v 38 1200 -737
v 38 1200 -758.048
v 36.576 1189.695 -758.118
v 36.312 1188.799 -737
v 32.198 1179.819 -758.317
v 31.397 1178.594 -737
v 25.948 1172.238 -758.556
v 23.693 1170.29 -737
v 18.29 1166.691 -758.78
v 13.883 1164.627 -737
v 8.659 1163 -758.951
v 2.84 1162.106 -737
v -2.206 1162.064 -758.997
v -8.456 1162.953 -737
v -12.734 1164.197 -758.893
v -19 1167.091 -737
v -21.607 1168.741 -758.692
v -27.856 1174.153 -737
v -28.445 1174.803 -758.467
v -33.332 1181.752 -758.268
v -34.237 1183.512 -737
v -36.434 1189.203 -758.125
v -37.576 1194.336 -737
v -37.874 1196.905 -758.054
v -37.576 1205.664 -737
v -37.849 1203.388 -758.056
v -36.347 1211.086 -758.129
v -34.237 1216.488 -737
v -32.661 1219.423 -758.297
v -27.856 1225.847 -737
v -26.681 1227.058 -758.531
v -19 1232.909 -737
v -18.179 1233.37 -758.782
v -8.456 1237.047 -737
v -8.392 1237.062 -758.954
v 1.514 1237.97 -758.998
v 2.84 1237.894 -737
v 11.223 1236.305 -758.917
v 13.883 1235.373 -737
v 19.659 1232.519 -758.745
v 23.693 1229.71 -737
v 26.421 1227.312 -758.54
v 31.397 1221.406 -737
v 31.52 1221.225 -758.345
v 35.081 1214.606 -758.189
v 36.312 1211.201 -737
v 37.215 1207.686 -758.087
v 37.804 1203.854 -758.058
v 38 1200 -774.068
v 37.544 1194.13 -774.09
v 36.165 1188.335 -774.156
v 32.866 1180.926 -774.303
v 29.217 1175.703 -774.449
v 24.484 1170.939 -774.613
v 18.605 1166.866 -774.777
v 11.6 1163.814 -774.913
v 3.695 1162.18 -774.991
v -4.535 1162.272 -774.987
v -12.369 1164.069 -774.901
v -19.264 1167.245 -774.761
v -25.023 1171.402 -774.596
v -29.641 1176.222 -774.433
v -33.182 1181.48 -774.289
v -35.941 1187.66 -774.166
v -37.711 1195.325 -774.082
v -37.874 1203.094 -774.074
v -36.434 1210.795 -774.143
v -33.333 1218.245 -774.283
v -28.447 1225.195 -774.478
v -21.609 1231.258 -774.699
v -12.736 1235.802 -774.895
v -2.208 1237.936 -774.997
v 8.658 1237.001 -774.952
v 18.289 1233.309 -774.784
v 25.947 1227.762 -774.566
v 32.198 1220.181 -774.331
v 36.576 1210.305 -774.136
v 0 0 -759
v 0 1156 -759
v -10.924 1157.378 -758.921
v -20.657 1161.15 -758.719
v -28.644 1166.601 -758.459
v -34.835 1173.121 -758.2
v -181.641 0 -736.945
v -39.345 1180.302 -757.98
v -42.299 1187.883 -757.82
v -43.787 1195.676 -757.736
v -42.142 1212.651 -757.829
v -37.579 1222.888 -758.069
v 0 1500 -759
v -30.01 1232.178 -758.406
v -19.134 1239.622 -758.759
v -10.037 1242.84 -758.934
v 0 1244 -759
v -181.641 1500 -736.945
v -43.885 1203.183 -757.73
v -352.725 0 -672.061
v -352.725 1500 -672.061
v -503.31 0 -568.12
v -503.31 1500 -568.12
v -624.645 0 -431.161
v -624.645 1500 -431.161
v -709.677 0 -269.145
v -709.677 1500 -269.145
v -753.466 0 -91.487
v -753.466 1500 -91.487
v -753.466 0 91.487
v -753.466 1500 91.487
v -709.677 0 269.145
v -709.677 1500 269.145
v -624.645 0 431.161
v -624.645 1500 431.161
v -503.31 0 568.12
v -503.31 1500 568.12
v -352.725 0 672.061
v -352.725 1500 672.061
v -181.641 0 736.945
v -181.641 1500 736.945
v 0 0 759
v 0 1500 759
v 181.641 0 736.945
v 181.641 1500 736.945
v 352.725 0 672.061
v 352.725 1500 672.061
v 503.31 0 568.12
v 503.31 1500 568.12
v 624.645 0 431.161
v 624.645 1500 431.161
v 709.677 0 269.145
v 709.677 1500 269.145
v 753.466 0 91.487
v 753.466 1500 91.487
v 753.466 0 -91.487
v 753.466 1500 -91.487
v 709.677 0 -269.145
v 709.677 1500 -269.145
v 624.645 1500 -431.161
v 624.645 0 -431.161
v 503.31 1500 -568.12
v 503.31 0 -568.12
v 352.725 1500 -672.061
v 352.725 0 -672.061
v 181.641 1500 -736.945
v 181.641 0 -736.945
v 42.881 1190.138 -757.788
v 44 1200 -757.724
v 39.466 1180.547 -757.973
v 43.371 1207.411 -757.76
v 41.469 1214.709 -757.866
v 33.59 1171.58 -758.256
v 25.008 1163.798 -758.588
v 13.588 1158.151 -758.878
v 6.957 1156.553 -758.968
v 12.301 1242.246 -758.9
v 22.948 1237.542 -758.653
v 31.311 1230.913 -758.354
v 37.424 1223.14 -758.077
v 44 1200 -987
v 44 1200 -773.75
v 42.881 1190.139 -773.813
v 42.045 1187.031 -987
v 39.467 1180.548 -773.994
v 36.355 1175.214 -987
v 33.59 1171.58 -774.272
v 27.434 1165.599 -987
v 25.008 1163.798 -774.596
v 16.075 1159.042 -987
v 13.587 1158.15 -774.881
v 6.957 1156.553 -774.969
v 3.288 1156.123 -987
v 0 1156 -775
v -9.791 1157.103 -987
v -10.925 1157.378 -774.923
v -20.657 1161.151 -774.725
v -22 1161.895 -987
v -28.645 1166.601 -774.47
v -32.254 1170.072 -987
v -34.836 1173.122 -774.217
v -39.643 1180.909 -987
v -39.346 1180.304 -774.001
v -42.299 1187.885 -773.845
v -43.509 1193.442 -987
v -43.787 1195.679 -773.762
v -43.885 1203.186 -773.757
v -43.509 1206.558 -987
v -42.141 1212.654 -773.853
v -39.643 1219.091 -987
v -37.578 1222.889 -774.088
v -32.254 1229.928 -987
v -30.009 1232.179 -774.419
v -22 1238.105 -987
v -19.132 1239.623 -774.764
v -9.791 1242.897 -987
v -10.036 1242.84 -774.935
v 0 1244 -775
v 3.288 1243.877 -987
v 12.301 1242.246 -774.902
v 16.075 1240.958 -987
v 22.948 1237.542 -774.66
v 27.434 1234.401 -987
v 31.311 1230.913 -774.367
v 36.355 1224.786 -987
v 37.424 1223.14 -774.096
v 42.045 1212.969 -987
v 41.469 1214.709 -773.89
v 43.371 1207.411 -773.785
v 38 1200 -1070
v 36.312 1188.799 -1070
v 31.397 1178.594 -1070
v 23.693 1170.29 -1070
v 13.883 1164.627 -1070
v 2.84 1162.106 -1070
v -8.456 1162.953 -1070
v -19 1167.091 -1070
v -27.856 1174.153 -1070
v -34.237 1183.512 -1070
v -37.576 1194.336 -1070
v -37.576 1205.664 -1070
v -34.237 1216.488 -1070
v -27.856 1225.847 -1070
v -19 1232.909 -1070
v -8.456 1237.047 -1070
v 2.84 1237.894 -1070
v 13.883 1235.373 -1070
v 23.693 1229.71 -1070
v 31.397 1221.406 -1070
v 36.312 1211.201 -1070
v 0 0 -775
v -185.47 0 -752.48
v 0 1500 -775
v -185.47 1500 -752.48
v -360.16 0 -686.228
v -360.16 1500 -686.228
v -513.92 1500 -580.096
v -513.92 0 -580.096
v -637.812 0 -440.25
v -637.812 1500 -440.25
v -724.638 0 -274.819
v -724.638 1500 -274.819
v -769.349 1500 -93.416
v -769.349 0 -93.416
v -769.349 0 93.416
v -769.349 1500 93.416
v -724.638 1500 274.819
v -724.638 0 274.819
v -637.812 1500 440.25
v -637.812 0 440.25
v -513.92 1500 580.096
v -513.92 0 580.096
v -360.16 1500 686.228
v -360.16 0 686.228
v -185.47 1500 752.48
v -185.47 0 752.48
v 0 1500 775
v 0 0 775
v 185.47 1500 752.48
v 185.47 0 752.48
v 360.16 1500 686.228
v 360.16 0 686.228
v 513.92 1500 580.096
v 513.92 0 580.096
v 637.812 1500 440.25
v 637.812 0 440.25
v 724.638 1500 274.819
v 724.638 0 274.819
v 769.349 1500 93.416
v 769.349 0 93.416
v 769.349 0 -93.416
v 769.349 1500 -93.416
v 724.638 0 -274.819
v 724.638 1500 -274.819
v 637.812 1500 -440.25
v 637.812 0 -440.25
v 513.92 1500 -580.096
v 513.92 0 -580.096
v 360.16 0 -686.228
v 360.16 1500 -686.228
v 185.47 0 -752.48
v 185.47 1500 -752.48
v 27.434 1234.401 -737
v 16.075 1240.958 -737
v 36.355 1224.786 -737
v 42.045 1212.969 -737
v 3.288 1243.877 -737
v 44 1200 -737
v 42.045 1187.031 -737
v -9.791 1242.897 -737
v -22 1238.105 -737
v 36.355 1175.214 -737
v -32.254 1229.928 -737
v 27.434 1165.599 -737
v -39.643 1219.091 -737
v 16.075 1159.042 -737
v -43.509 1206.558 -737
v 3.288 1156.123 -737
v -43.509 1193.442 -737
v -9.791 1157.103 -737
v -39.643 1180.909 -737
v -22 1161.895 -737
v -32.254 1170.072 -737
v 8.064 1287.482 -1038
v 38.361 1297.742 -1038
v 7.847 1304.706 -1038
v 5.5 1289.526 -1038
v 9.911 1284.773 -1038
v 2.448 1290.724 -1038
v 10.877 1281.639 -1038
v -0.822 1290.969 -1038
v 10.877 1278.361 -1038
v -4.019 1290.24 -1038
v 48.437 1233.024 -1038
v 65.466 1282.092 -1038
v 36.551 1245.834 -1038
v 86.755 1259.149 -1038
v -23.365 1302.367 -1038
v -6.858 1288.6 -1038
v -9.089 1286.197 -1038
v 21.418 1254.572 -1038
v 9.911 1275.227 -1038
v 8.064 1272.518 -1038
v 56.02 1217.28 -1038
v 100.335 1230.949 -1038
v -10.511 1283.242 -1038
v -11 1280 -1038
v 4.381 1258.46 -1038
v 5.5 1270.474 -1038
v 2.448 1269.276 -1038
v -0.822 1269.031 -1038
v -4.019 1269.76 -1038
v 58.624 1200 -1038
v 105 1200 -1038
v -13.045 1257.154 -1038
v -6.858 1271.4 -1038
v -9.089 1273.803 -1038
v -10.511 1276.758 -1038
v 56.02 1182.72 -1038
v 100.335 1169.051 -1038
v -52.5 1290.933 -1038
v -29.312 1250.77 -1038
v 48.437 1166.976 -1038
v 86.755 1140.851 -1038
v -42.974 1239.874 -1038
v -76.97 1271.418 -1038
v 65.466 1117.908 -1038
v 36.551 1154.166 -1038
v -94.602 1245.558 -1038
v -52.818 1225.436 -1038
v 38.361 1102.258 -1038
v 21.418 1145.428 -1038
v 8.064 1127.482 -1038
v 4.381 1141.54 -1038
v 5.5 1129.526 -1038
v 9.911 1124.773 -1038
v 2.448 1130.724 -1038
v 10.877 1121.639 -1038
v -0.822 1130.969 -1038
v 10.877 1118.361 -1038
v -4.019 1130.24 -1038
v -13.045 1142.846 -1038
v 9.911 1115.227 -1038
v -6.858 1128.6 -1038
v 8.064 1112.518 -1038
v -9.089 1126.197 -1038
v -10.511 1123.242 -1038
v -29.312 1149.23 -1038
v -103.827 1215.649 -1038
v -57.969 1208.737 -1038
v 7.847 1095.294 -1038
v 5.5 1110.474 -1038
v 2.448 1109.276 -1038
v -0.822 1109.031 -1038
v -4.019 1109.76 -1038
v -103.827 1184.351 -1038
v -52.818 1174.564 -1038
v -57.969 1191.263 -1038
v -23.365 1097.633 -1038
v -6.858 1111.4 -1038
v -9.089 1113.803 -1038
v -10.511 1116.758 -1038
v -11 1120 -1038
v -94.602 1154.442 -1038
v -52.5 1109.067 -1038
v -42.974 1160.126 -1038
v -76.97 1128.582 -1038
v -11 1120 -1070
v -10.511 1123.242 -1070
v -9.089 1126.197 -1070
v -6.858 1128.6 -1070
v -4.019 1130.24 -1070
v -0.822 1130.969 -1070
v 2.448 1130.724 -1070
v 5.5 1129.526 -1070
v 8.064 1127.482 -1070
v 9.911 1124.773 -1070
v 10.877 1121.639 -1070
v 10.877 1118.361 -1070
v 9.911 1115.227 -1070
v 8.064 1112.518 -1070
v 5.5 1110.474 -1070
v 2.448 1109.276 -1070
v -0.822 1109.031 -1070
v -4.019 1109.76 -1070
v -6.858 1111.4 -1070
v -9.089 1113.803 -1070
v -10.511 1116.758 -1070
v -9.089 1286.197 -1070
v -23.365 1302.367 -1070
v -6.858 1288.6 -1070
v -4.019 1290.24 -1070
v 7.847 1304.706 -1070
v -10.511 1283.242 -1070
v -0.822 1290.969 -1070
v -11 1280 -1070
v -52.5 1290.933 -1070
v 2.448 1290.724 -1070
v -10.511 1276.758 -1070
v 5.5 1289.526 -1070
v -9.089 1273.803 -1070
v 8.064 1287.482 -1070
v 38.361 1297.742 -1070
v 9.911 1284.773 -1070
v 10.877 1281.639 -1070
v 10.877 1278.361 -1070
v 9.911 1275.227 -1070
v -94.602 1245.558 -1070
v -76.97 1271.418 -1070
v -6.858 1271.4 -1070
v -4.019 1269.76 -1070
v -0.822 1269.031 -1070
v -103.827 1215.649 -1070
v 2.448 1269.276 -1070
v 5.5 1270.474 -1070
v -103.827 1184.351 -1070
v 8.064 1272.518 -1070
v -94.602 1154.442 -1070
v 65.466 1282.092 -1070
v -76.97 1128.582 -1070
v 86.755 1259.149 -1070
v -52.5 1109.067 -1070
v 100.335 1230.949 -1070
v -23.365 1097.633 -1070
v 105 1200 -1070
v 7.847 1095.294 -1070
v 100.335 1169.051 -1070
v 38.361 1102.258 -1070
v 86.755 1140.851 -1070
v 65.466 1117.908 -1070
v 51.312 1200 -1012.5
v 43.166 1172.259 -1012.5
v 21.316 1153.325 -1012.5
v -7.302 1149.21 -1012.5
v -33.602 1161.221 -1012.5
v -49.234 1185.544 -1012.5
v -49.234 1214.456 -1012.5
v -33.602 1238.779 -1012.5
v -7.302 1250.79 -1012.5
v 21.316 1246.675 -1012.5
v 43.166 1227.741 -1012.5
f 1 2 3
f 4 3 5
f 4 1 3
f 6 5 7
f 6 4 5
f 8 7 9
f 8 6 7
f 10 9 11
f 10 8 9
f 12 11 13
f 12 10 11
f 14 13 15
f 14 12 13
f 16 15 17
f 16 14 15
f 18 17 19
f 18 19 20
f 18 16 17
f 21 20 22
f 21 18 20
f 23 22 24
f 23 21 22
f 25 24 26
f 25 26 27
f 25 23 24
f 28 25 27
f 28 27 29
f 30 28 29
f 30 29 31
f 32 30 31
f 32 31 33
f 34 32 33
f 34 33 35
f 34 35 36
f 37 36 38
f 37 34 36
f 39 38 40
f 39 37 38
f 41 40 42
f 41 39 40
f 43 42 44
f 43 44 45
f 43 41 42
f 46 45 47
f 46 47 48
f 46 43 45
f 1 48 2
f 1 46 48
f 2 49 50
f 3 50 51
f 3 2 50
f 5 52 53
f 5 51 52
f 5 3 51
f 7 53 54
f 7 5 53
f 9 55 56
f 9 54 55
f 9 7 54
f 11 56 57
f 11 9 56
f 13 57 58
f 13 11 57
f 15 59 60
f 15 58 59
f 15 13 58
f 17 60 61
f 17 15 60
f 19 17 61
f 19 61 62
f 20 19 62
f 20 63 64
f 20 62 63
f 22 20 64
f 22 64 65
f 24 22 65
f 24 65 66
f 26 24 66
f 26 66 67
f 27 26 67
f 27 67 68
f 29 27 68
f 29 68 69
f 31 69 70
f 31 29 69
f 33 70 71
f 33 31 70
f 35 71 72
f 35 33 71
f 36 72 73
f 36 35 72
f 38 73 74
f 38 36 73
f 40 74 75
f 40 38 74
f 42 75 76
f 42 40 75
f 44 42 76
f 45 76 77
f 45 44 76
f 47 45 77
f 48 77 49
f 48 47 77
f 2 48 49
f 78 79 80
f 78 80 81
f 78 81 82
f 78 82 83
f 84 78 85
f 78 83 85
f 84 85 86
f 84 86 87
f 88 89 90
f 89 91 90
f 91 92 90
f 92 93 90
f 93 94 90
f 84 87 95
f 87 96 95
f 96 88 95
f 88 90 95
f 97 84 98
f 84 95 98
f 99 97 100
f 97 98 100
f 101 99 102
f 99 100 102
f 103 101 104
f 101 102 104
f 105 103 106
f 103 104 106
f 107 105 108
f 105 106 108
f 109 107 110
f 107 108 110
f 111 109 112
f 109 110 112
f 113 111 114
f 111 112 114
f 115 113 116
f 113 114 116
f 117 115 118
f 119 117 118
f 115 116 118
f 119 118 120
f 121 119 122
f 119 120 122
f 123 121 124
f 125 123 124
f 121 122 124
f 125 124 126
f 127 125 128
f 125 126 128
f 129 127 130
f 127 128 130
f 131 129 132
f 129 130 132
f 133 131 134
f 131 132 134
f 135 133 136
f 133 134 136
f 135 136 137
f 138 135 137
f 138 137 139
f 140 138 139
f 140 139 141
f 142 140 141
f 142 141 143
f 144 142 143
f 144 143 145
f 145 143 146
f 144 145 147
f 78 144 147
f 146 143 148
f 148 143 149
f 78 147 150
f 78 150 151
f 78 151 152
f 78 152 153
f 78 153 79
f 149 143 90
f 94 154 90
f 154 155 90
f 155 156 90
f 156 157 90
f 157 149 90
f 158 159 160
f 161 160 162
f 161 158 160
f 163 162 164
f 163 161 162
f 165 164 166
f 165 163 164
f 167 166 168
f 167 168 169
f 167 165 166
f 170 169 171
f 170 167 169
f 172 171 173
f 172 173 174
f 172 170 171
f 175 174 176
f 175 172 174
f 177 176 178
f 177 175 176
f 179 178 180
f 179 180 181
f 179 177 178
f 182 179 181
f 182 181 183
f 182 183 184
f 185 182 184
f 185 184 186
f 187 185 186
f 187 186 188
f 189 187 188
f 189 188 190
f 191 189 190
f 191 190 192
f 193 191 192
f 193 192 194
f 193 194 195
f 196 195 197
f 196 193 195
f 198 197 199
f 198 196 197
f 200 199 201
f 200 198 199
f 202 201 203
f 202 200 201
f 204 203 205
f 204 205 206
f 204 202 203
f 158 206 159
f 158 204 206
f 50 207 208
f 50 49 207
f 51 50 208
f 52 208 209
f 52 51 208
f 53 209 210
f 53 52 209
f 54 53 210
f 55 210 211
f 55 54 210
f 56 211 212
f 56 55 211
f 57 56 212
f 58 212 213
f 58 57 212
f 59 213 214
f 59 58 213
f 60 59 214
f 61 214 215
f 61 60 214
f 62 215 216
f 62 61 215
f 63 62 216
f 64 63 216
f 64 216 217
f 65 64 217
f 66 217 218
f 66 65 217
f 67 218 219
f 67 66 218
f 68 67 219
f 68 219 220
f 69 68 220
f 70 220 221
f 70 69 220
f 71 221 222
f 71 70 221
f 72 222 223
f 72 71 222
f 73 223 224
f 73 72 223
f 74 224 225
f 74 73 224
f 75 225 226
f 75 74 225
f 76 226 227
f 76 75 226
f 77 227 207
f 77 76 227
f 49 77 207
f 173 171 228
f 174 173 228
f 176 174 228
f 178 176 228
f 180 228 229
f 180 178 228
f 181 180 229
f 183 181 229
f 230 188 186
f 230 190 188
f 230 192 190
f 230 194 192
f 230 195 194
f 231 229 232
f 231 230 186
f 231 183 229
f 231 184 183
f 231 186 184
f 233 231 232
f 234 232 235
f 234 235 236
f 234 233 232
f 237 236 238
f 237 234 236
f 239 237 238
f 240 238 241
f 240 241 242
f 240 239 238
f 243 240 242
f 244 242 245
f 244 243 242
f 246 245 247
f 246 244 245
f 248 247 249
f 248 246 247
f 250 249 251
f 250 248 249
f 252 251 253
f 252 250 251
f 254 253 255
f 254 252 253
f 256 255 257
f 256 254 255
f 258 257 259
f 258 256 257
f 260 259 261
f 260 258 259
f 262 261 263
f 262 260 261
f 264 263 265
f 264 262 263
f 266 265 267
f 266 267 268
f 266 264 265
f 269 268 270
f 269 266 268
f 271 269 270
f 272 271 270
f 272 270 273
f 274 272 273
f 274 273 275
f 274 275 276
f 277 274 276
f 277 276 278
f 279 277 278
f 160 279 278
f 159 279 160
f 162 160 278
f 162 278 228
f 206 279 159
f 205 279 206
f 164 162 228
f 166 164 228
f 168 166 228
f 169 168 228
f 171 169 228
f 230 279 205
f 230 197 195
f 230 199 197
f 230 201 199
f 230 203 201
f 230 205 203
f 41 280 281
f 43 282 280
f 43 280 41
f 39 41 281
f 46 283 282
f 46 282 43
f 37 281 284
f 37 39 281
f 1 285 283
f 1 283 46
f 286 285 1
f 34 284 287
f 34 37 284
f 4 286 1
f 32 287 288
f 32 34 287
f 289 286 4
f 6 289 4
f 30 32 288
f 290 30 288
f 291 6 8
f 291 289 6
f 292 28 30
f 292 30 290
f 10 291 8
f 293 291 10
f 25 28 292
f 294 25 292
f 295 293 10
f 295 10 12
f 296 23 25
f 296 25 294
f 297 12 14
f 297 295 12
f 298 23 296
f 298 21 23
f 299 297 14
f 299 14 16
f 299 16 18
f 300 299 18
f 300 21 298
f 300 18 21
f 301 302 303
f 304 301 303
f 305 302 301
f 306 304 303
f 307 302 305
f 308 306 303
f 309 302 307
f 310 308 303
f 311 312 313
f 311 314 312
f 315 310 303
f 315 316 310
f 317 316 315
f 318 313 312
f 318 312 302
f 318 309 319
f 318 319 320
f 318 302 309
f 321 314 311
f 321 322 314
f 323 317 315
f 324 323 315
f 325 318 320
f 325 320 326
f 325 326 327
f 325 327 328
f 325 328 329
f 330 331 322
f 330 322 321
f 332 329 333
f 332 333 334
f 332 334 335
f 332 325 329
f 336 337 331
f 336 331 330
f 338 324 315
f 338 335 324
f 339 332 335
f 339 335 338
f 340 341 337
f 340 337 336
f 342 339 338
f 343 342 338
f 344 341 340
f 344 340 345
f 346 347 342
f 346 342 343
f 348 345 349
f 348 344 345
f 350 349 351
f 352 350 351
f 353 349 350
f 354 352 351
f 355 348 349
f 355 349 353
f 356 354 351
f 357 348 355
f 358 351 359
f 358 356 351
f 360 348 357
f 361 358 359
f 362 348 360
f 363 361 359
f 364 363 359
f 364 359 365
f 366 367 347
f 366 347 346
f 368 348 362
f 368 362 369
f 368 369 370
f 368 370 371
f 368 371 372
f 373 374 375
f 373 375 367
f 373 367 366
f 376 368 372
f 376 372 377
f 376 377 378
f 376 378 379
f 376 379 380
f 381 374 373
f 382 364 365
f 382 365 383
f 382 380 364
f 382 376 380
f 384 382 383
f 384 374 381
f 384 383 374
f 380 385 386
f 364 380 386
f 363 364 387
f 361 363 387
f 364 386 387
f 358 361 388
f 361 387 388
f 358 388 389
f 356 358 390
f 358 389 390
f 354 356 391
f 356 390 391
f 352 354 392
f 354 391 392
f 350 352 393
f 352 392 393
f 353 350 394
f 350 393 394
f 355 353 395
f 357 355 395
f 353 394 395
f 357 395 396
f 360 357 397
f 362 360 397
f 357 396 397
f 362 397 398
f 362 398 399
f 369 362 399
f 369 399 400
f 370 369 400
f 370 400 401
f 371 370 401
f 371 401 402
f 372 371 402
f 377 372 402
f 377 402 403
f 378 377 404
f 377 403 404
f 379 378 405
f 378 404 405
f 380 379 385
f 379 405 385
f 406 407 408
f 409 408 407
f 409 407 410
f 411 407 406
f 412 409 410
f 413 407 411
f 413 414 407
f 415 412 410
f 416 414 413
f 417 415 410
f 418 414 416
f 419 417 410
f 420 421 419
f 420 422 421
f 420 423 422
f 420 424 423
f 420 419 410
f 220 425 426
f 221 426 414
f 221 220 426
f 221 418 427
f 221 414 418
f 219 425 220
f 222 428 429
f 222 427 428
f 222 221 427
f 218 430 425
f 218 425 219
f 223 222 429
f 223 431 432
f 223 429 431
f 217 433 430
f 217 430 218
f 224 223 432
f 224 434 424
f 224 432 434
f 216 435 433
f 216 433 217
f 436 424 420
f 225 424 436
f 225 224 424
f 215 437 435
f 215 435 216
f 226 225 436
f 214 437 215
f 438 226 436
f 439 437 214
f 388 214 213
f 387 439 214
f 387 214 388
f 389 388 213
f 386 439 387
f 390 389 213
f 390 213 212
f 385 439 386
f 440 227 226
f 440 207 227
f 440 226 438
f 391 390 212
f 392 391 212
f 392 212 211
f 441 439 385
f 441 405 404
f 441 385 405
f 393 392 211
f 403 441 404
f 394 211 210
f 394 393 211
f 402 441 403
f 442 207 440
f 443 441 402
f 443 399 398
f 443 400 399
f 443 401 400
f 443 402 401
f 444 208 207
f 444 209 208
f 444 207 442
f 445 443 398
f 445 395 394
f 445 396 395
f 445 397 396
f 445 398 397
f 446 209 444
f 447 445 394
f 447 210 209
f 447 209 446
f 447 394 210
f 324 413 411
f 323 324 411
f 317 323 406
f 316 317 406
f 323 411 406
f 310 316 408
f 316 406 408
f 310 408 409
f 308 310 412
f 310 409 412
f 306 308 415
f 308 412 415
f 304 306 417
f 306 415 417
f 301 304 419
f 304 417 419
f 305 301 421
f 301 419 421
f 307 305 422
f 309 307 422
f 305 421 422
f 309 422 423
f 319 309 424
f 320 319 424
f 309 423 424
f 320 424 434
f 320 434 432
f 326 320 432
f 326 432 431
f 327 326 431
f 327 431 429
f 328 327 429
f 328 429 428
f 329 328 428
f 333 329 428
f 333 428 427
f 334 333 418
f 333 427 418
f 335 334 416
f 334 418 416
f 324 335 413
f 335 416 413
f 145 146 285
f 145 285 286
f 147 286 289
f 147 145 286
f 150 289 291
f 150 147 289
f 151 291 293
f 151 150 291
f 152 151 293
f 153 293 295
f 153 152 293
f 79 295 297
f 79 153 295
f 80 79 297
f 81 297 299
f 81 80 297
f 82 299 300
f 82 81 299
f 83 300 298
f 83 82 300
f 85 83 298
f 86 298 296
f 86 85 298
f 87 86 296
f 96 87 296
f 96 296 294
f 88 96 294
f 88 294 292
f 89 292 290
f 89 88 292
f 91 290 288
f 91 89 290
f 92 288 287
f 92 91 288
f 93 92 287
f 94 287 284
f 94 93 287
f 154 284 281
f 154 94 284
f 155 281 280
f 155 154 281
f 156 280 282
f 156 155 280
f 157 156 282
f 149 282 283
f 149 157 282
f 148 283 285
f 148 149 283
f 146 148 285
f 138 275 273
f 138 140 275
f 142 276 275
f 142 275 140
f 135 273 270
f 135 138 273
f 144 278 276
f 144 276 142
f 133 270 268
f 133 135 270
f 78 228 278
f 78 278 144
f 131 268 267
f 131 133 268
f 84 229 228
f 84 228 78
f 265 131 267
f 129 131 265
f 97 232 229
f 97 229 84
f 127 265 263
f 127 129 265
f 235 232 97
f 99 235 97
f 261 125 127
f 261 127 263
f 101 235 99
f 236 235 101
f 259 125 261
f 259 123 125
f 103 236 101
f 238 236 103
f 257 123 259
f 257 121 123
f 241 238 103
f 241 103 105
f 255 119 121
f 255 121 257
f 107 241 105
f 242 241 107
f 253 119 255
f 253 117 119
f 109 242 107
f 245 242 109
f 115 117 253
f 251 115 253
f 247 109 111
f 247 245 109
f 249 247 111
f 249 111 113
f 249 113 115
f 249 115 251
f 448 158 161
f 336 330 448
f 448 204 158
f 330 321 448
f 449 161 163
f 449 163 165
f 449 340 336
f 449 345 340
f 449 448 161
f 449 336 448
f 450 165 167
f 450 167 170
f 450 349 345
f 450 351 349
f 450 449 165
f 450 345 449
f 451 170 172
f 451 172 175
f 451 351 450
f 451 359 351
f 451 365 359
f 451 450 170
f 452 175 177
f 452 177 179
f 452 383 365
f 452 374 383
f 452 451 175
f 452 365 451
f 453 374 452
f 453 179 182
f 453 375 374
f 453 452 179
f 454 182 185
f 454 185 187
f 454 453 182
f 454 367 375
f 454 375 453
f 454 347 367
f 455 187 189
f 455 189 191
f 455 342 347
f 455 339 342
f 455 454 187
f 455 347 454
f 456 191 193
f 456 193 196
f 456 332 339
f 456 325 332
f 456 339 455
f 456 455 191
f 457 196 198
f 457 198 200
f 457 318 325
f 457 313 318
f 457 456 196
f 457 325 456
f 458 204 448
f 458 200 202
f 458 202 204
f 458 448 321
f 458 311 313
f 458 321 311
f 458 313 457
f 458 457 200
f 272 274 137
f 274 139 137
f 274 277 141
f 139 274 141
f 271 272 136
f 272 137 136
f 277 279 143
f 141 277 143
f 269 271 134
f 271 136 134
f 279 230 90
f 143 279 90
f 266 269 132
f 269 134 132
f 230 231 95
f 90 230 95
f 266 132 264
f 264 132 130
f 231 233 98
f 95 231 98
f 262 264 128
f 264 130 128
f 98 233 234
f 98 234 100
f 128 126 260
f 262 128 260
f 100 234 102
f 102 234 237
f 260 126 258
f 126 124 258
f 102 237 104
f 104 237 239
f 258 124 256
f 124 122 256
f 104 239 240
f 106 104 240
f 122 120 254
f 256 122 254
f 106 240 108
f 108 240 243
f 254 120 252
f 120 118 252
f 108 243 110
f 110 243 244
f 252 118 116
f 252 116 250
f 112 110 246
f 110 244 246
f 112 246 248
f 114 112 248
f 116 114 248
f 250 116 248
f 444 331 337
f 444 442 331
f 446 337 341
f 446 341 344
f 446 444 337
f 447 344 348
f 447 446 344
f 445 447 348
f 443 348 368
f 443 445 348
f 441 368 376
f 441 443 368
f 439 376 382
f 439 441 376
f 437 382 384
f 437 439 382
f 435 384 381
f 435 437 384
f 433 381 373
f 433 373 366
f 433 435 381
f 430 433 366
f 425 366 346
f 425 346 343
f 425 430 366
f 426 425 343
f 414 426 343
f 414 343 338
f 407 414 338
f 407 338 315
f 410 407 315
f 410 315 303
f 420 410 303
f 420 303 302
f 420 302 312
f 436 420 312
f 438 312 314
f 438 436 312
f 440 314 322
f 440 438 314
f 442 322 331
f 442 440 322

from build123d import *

# Parameters (mm, degrees)
SKETCH1_W          = 16
SKETCH1_H          = 1500
SKETCH3_R          = 11
CUT_EXTRUDE1_DEPTH = 32
CUT_EXTRUDE2_START = -400
SKETCH4_R          = 38
CUT_EXTRUDE2_DEPTH = 400


with BuildPart() as part:
    # Sketch1 → Revolve1 (revolve)
    with BuildSketch(Plane.XY, mode=Mode.PRIVATE) as revolve1_sk:
        with Locations((767, 750)):
            Rectangle(SKETCH1_W, SKETCH1_H)
    revolve(revolve1_sk.sketch.rotate(Axis((0, 0, 0), (0, 1, 0)), 90), axis=Axis((0, 0, 0), (0, 1, 0)))

    # Sketch2 → Revolve2 (revolve)
    with BuildSketch(Plane(origin=(0, 0, 0), x_dir=(0, 0, -1), z_dir=(1, 0, 0)), mode=Mode.PRIVATE) as revolve2_sk:
        Polygon((1070, 1238), (737, 1238), (737, 1244), (987, 1244), (1038, 1258.624014674), (1038, 1305), (1070, 1305), align=None)
    revolve(revolve2_sk.sketch.rotate(Axis((0, 1200, -775), (0, 0, -1)), 90), axis=Axis((0, 1200, -775), (0, 0, -1)))

    # Sketch3 → Cut-Extrude1 (cut)
    with BuildSketch(Plane(origin=(0, 0, -1070), x_dir=(-1, 0, 0), z_dir=(0, 0, -1))):
        with Locations((0, 1280)):
            Circle(SKETCH3_R)
        with Locations((0, 1120)):
            Circle(SKETCH3_R)
    extrude(amount=-CUT_EXTRUDE1_DEPTH, mode=Mode.SUBTRACT)

    # Sketch4 → Cut-Extrude2 (cut)
    with BuildSketch(Plane(origin=(0, 0, -1070), x_dir=(-1, 0, 0), z_dir=(0, 0, -1)).offset(CUT_EXTRUDE2_START)):
        with Locations(Location((0, 1200, 0), (0, 0, 180))):
            Circle(SKETCH4_R)
    extrude(amount=CUT_EXTRUDE2_DEPTH, mode=Mode.SUBTRACT)


solid = part.part
